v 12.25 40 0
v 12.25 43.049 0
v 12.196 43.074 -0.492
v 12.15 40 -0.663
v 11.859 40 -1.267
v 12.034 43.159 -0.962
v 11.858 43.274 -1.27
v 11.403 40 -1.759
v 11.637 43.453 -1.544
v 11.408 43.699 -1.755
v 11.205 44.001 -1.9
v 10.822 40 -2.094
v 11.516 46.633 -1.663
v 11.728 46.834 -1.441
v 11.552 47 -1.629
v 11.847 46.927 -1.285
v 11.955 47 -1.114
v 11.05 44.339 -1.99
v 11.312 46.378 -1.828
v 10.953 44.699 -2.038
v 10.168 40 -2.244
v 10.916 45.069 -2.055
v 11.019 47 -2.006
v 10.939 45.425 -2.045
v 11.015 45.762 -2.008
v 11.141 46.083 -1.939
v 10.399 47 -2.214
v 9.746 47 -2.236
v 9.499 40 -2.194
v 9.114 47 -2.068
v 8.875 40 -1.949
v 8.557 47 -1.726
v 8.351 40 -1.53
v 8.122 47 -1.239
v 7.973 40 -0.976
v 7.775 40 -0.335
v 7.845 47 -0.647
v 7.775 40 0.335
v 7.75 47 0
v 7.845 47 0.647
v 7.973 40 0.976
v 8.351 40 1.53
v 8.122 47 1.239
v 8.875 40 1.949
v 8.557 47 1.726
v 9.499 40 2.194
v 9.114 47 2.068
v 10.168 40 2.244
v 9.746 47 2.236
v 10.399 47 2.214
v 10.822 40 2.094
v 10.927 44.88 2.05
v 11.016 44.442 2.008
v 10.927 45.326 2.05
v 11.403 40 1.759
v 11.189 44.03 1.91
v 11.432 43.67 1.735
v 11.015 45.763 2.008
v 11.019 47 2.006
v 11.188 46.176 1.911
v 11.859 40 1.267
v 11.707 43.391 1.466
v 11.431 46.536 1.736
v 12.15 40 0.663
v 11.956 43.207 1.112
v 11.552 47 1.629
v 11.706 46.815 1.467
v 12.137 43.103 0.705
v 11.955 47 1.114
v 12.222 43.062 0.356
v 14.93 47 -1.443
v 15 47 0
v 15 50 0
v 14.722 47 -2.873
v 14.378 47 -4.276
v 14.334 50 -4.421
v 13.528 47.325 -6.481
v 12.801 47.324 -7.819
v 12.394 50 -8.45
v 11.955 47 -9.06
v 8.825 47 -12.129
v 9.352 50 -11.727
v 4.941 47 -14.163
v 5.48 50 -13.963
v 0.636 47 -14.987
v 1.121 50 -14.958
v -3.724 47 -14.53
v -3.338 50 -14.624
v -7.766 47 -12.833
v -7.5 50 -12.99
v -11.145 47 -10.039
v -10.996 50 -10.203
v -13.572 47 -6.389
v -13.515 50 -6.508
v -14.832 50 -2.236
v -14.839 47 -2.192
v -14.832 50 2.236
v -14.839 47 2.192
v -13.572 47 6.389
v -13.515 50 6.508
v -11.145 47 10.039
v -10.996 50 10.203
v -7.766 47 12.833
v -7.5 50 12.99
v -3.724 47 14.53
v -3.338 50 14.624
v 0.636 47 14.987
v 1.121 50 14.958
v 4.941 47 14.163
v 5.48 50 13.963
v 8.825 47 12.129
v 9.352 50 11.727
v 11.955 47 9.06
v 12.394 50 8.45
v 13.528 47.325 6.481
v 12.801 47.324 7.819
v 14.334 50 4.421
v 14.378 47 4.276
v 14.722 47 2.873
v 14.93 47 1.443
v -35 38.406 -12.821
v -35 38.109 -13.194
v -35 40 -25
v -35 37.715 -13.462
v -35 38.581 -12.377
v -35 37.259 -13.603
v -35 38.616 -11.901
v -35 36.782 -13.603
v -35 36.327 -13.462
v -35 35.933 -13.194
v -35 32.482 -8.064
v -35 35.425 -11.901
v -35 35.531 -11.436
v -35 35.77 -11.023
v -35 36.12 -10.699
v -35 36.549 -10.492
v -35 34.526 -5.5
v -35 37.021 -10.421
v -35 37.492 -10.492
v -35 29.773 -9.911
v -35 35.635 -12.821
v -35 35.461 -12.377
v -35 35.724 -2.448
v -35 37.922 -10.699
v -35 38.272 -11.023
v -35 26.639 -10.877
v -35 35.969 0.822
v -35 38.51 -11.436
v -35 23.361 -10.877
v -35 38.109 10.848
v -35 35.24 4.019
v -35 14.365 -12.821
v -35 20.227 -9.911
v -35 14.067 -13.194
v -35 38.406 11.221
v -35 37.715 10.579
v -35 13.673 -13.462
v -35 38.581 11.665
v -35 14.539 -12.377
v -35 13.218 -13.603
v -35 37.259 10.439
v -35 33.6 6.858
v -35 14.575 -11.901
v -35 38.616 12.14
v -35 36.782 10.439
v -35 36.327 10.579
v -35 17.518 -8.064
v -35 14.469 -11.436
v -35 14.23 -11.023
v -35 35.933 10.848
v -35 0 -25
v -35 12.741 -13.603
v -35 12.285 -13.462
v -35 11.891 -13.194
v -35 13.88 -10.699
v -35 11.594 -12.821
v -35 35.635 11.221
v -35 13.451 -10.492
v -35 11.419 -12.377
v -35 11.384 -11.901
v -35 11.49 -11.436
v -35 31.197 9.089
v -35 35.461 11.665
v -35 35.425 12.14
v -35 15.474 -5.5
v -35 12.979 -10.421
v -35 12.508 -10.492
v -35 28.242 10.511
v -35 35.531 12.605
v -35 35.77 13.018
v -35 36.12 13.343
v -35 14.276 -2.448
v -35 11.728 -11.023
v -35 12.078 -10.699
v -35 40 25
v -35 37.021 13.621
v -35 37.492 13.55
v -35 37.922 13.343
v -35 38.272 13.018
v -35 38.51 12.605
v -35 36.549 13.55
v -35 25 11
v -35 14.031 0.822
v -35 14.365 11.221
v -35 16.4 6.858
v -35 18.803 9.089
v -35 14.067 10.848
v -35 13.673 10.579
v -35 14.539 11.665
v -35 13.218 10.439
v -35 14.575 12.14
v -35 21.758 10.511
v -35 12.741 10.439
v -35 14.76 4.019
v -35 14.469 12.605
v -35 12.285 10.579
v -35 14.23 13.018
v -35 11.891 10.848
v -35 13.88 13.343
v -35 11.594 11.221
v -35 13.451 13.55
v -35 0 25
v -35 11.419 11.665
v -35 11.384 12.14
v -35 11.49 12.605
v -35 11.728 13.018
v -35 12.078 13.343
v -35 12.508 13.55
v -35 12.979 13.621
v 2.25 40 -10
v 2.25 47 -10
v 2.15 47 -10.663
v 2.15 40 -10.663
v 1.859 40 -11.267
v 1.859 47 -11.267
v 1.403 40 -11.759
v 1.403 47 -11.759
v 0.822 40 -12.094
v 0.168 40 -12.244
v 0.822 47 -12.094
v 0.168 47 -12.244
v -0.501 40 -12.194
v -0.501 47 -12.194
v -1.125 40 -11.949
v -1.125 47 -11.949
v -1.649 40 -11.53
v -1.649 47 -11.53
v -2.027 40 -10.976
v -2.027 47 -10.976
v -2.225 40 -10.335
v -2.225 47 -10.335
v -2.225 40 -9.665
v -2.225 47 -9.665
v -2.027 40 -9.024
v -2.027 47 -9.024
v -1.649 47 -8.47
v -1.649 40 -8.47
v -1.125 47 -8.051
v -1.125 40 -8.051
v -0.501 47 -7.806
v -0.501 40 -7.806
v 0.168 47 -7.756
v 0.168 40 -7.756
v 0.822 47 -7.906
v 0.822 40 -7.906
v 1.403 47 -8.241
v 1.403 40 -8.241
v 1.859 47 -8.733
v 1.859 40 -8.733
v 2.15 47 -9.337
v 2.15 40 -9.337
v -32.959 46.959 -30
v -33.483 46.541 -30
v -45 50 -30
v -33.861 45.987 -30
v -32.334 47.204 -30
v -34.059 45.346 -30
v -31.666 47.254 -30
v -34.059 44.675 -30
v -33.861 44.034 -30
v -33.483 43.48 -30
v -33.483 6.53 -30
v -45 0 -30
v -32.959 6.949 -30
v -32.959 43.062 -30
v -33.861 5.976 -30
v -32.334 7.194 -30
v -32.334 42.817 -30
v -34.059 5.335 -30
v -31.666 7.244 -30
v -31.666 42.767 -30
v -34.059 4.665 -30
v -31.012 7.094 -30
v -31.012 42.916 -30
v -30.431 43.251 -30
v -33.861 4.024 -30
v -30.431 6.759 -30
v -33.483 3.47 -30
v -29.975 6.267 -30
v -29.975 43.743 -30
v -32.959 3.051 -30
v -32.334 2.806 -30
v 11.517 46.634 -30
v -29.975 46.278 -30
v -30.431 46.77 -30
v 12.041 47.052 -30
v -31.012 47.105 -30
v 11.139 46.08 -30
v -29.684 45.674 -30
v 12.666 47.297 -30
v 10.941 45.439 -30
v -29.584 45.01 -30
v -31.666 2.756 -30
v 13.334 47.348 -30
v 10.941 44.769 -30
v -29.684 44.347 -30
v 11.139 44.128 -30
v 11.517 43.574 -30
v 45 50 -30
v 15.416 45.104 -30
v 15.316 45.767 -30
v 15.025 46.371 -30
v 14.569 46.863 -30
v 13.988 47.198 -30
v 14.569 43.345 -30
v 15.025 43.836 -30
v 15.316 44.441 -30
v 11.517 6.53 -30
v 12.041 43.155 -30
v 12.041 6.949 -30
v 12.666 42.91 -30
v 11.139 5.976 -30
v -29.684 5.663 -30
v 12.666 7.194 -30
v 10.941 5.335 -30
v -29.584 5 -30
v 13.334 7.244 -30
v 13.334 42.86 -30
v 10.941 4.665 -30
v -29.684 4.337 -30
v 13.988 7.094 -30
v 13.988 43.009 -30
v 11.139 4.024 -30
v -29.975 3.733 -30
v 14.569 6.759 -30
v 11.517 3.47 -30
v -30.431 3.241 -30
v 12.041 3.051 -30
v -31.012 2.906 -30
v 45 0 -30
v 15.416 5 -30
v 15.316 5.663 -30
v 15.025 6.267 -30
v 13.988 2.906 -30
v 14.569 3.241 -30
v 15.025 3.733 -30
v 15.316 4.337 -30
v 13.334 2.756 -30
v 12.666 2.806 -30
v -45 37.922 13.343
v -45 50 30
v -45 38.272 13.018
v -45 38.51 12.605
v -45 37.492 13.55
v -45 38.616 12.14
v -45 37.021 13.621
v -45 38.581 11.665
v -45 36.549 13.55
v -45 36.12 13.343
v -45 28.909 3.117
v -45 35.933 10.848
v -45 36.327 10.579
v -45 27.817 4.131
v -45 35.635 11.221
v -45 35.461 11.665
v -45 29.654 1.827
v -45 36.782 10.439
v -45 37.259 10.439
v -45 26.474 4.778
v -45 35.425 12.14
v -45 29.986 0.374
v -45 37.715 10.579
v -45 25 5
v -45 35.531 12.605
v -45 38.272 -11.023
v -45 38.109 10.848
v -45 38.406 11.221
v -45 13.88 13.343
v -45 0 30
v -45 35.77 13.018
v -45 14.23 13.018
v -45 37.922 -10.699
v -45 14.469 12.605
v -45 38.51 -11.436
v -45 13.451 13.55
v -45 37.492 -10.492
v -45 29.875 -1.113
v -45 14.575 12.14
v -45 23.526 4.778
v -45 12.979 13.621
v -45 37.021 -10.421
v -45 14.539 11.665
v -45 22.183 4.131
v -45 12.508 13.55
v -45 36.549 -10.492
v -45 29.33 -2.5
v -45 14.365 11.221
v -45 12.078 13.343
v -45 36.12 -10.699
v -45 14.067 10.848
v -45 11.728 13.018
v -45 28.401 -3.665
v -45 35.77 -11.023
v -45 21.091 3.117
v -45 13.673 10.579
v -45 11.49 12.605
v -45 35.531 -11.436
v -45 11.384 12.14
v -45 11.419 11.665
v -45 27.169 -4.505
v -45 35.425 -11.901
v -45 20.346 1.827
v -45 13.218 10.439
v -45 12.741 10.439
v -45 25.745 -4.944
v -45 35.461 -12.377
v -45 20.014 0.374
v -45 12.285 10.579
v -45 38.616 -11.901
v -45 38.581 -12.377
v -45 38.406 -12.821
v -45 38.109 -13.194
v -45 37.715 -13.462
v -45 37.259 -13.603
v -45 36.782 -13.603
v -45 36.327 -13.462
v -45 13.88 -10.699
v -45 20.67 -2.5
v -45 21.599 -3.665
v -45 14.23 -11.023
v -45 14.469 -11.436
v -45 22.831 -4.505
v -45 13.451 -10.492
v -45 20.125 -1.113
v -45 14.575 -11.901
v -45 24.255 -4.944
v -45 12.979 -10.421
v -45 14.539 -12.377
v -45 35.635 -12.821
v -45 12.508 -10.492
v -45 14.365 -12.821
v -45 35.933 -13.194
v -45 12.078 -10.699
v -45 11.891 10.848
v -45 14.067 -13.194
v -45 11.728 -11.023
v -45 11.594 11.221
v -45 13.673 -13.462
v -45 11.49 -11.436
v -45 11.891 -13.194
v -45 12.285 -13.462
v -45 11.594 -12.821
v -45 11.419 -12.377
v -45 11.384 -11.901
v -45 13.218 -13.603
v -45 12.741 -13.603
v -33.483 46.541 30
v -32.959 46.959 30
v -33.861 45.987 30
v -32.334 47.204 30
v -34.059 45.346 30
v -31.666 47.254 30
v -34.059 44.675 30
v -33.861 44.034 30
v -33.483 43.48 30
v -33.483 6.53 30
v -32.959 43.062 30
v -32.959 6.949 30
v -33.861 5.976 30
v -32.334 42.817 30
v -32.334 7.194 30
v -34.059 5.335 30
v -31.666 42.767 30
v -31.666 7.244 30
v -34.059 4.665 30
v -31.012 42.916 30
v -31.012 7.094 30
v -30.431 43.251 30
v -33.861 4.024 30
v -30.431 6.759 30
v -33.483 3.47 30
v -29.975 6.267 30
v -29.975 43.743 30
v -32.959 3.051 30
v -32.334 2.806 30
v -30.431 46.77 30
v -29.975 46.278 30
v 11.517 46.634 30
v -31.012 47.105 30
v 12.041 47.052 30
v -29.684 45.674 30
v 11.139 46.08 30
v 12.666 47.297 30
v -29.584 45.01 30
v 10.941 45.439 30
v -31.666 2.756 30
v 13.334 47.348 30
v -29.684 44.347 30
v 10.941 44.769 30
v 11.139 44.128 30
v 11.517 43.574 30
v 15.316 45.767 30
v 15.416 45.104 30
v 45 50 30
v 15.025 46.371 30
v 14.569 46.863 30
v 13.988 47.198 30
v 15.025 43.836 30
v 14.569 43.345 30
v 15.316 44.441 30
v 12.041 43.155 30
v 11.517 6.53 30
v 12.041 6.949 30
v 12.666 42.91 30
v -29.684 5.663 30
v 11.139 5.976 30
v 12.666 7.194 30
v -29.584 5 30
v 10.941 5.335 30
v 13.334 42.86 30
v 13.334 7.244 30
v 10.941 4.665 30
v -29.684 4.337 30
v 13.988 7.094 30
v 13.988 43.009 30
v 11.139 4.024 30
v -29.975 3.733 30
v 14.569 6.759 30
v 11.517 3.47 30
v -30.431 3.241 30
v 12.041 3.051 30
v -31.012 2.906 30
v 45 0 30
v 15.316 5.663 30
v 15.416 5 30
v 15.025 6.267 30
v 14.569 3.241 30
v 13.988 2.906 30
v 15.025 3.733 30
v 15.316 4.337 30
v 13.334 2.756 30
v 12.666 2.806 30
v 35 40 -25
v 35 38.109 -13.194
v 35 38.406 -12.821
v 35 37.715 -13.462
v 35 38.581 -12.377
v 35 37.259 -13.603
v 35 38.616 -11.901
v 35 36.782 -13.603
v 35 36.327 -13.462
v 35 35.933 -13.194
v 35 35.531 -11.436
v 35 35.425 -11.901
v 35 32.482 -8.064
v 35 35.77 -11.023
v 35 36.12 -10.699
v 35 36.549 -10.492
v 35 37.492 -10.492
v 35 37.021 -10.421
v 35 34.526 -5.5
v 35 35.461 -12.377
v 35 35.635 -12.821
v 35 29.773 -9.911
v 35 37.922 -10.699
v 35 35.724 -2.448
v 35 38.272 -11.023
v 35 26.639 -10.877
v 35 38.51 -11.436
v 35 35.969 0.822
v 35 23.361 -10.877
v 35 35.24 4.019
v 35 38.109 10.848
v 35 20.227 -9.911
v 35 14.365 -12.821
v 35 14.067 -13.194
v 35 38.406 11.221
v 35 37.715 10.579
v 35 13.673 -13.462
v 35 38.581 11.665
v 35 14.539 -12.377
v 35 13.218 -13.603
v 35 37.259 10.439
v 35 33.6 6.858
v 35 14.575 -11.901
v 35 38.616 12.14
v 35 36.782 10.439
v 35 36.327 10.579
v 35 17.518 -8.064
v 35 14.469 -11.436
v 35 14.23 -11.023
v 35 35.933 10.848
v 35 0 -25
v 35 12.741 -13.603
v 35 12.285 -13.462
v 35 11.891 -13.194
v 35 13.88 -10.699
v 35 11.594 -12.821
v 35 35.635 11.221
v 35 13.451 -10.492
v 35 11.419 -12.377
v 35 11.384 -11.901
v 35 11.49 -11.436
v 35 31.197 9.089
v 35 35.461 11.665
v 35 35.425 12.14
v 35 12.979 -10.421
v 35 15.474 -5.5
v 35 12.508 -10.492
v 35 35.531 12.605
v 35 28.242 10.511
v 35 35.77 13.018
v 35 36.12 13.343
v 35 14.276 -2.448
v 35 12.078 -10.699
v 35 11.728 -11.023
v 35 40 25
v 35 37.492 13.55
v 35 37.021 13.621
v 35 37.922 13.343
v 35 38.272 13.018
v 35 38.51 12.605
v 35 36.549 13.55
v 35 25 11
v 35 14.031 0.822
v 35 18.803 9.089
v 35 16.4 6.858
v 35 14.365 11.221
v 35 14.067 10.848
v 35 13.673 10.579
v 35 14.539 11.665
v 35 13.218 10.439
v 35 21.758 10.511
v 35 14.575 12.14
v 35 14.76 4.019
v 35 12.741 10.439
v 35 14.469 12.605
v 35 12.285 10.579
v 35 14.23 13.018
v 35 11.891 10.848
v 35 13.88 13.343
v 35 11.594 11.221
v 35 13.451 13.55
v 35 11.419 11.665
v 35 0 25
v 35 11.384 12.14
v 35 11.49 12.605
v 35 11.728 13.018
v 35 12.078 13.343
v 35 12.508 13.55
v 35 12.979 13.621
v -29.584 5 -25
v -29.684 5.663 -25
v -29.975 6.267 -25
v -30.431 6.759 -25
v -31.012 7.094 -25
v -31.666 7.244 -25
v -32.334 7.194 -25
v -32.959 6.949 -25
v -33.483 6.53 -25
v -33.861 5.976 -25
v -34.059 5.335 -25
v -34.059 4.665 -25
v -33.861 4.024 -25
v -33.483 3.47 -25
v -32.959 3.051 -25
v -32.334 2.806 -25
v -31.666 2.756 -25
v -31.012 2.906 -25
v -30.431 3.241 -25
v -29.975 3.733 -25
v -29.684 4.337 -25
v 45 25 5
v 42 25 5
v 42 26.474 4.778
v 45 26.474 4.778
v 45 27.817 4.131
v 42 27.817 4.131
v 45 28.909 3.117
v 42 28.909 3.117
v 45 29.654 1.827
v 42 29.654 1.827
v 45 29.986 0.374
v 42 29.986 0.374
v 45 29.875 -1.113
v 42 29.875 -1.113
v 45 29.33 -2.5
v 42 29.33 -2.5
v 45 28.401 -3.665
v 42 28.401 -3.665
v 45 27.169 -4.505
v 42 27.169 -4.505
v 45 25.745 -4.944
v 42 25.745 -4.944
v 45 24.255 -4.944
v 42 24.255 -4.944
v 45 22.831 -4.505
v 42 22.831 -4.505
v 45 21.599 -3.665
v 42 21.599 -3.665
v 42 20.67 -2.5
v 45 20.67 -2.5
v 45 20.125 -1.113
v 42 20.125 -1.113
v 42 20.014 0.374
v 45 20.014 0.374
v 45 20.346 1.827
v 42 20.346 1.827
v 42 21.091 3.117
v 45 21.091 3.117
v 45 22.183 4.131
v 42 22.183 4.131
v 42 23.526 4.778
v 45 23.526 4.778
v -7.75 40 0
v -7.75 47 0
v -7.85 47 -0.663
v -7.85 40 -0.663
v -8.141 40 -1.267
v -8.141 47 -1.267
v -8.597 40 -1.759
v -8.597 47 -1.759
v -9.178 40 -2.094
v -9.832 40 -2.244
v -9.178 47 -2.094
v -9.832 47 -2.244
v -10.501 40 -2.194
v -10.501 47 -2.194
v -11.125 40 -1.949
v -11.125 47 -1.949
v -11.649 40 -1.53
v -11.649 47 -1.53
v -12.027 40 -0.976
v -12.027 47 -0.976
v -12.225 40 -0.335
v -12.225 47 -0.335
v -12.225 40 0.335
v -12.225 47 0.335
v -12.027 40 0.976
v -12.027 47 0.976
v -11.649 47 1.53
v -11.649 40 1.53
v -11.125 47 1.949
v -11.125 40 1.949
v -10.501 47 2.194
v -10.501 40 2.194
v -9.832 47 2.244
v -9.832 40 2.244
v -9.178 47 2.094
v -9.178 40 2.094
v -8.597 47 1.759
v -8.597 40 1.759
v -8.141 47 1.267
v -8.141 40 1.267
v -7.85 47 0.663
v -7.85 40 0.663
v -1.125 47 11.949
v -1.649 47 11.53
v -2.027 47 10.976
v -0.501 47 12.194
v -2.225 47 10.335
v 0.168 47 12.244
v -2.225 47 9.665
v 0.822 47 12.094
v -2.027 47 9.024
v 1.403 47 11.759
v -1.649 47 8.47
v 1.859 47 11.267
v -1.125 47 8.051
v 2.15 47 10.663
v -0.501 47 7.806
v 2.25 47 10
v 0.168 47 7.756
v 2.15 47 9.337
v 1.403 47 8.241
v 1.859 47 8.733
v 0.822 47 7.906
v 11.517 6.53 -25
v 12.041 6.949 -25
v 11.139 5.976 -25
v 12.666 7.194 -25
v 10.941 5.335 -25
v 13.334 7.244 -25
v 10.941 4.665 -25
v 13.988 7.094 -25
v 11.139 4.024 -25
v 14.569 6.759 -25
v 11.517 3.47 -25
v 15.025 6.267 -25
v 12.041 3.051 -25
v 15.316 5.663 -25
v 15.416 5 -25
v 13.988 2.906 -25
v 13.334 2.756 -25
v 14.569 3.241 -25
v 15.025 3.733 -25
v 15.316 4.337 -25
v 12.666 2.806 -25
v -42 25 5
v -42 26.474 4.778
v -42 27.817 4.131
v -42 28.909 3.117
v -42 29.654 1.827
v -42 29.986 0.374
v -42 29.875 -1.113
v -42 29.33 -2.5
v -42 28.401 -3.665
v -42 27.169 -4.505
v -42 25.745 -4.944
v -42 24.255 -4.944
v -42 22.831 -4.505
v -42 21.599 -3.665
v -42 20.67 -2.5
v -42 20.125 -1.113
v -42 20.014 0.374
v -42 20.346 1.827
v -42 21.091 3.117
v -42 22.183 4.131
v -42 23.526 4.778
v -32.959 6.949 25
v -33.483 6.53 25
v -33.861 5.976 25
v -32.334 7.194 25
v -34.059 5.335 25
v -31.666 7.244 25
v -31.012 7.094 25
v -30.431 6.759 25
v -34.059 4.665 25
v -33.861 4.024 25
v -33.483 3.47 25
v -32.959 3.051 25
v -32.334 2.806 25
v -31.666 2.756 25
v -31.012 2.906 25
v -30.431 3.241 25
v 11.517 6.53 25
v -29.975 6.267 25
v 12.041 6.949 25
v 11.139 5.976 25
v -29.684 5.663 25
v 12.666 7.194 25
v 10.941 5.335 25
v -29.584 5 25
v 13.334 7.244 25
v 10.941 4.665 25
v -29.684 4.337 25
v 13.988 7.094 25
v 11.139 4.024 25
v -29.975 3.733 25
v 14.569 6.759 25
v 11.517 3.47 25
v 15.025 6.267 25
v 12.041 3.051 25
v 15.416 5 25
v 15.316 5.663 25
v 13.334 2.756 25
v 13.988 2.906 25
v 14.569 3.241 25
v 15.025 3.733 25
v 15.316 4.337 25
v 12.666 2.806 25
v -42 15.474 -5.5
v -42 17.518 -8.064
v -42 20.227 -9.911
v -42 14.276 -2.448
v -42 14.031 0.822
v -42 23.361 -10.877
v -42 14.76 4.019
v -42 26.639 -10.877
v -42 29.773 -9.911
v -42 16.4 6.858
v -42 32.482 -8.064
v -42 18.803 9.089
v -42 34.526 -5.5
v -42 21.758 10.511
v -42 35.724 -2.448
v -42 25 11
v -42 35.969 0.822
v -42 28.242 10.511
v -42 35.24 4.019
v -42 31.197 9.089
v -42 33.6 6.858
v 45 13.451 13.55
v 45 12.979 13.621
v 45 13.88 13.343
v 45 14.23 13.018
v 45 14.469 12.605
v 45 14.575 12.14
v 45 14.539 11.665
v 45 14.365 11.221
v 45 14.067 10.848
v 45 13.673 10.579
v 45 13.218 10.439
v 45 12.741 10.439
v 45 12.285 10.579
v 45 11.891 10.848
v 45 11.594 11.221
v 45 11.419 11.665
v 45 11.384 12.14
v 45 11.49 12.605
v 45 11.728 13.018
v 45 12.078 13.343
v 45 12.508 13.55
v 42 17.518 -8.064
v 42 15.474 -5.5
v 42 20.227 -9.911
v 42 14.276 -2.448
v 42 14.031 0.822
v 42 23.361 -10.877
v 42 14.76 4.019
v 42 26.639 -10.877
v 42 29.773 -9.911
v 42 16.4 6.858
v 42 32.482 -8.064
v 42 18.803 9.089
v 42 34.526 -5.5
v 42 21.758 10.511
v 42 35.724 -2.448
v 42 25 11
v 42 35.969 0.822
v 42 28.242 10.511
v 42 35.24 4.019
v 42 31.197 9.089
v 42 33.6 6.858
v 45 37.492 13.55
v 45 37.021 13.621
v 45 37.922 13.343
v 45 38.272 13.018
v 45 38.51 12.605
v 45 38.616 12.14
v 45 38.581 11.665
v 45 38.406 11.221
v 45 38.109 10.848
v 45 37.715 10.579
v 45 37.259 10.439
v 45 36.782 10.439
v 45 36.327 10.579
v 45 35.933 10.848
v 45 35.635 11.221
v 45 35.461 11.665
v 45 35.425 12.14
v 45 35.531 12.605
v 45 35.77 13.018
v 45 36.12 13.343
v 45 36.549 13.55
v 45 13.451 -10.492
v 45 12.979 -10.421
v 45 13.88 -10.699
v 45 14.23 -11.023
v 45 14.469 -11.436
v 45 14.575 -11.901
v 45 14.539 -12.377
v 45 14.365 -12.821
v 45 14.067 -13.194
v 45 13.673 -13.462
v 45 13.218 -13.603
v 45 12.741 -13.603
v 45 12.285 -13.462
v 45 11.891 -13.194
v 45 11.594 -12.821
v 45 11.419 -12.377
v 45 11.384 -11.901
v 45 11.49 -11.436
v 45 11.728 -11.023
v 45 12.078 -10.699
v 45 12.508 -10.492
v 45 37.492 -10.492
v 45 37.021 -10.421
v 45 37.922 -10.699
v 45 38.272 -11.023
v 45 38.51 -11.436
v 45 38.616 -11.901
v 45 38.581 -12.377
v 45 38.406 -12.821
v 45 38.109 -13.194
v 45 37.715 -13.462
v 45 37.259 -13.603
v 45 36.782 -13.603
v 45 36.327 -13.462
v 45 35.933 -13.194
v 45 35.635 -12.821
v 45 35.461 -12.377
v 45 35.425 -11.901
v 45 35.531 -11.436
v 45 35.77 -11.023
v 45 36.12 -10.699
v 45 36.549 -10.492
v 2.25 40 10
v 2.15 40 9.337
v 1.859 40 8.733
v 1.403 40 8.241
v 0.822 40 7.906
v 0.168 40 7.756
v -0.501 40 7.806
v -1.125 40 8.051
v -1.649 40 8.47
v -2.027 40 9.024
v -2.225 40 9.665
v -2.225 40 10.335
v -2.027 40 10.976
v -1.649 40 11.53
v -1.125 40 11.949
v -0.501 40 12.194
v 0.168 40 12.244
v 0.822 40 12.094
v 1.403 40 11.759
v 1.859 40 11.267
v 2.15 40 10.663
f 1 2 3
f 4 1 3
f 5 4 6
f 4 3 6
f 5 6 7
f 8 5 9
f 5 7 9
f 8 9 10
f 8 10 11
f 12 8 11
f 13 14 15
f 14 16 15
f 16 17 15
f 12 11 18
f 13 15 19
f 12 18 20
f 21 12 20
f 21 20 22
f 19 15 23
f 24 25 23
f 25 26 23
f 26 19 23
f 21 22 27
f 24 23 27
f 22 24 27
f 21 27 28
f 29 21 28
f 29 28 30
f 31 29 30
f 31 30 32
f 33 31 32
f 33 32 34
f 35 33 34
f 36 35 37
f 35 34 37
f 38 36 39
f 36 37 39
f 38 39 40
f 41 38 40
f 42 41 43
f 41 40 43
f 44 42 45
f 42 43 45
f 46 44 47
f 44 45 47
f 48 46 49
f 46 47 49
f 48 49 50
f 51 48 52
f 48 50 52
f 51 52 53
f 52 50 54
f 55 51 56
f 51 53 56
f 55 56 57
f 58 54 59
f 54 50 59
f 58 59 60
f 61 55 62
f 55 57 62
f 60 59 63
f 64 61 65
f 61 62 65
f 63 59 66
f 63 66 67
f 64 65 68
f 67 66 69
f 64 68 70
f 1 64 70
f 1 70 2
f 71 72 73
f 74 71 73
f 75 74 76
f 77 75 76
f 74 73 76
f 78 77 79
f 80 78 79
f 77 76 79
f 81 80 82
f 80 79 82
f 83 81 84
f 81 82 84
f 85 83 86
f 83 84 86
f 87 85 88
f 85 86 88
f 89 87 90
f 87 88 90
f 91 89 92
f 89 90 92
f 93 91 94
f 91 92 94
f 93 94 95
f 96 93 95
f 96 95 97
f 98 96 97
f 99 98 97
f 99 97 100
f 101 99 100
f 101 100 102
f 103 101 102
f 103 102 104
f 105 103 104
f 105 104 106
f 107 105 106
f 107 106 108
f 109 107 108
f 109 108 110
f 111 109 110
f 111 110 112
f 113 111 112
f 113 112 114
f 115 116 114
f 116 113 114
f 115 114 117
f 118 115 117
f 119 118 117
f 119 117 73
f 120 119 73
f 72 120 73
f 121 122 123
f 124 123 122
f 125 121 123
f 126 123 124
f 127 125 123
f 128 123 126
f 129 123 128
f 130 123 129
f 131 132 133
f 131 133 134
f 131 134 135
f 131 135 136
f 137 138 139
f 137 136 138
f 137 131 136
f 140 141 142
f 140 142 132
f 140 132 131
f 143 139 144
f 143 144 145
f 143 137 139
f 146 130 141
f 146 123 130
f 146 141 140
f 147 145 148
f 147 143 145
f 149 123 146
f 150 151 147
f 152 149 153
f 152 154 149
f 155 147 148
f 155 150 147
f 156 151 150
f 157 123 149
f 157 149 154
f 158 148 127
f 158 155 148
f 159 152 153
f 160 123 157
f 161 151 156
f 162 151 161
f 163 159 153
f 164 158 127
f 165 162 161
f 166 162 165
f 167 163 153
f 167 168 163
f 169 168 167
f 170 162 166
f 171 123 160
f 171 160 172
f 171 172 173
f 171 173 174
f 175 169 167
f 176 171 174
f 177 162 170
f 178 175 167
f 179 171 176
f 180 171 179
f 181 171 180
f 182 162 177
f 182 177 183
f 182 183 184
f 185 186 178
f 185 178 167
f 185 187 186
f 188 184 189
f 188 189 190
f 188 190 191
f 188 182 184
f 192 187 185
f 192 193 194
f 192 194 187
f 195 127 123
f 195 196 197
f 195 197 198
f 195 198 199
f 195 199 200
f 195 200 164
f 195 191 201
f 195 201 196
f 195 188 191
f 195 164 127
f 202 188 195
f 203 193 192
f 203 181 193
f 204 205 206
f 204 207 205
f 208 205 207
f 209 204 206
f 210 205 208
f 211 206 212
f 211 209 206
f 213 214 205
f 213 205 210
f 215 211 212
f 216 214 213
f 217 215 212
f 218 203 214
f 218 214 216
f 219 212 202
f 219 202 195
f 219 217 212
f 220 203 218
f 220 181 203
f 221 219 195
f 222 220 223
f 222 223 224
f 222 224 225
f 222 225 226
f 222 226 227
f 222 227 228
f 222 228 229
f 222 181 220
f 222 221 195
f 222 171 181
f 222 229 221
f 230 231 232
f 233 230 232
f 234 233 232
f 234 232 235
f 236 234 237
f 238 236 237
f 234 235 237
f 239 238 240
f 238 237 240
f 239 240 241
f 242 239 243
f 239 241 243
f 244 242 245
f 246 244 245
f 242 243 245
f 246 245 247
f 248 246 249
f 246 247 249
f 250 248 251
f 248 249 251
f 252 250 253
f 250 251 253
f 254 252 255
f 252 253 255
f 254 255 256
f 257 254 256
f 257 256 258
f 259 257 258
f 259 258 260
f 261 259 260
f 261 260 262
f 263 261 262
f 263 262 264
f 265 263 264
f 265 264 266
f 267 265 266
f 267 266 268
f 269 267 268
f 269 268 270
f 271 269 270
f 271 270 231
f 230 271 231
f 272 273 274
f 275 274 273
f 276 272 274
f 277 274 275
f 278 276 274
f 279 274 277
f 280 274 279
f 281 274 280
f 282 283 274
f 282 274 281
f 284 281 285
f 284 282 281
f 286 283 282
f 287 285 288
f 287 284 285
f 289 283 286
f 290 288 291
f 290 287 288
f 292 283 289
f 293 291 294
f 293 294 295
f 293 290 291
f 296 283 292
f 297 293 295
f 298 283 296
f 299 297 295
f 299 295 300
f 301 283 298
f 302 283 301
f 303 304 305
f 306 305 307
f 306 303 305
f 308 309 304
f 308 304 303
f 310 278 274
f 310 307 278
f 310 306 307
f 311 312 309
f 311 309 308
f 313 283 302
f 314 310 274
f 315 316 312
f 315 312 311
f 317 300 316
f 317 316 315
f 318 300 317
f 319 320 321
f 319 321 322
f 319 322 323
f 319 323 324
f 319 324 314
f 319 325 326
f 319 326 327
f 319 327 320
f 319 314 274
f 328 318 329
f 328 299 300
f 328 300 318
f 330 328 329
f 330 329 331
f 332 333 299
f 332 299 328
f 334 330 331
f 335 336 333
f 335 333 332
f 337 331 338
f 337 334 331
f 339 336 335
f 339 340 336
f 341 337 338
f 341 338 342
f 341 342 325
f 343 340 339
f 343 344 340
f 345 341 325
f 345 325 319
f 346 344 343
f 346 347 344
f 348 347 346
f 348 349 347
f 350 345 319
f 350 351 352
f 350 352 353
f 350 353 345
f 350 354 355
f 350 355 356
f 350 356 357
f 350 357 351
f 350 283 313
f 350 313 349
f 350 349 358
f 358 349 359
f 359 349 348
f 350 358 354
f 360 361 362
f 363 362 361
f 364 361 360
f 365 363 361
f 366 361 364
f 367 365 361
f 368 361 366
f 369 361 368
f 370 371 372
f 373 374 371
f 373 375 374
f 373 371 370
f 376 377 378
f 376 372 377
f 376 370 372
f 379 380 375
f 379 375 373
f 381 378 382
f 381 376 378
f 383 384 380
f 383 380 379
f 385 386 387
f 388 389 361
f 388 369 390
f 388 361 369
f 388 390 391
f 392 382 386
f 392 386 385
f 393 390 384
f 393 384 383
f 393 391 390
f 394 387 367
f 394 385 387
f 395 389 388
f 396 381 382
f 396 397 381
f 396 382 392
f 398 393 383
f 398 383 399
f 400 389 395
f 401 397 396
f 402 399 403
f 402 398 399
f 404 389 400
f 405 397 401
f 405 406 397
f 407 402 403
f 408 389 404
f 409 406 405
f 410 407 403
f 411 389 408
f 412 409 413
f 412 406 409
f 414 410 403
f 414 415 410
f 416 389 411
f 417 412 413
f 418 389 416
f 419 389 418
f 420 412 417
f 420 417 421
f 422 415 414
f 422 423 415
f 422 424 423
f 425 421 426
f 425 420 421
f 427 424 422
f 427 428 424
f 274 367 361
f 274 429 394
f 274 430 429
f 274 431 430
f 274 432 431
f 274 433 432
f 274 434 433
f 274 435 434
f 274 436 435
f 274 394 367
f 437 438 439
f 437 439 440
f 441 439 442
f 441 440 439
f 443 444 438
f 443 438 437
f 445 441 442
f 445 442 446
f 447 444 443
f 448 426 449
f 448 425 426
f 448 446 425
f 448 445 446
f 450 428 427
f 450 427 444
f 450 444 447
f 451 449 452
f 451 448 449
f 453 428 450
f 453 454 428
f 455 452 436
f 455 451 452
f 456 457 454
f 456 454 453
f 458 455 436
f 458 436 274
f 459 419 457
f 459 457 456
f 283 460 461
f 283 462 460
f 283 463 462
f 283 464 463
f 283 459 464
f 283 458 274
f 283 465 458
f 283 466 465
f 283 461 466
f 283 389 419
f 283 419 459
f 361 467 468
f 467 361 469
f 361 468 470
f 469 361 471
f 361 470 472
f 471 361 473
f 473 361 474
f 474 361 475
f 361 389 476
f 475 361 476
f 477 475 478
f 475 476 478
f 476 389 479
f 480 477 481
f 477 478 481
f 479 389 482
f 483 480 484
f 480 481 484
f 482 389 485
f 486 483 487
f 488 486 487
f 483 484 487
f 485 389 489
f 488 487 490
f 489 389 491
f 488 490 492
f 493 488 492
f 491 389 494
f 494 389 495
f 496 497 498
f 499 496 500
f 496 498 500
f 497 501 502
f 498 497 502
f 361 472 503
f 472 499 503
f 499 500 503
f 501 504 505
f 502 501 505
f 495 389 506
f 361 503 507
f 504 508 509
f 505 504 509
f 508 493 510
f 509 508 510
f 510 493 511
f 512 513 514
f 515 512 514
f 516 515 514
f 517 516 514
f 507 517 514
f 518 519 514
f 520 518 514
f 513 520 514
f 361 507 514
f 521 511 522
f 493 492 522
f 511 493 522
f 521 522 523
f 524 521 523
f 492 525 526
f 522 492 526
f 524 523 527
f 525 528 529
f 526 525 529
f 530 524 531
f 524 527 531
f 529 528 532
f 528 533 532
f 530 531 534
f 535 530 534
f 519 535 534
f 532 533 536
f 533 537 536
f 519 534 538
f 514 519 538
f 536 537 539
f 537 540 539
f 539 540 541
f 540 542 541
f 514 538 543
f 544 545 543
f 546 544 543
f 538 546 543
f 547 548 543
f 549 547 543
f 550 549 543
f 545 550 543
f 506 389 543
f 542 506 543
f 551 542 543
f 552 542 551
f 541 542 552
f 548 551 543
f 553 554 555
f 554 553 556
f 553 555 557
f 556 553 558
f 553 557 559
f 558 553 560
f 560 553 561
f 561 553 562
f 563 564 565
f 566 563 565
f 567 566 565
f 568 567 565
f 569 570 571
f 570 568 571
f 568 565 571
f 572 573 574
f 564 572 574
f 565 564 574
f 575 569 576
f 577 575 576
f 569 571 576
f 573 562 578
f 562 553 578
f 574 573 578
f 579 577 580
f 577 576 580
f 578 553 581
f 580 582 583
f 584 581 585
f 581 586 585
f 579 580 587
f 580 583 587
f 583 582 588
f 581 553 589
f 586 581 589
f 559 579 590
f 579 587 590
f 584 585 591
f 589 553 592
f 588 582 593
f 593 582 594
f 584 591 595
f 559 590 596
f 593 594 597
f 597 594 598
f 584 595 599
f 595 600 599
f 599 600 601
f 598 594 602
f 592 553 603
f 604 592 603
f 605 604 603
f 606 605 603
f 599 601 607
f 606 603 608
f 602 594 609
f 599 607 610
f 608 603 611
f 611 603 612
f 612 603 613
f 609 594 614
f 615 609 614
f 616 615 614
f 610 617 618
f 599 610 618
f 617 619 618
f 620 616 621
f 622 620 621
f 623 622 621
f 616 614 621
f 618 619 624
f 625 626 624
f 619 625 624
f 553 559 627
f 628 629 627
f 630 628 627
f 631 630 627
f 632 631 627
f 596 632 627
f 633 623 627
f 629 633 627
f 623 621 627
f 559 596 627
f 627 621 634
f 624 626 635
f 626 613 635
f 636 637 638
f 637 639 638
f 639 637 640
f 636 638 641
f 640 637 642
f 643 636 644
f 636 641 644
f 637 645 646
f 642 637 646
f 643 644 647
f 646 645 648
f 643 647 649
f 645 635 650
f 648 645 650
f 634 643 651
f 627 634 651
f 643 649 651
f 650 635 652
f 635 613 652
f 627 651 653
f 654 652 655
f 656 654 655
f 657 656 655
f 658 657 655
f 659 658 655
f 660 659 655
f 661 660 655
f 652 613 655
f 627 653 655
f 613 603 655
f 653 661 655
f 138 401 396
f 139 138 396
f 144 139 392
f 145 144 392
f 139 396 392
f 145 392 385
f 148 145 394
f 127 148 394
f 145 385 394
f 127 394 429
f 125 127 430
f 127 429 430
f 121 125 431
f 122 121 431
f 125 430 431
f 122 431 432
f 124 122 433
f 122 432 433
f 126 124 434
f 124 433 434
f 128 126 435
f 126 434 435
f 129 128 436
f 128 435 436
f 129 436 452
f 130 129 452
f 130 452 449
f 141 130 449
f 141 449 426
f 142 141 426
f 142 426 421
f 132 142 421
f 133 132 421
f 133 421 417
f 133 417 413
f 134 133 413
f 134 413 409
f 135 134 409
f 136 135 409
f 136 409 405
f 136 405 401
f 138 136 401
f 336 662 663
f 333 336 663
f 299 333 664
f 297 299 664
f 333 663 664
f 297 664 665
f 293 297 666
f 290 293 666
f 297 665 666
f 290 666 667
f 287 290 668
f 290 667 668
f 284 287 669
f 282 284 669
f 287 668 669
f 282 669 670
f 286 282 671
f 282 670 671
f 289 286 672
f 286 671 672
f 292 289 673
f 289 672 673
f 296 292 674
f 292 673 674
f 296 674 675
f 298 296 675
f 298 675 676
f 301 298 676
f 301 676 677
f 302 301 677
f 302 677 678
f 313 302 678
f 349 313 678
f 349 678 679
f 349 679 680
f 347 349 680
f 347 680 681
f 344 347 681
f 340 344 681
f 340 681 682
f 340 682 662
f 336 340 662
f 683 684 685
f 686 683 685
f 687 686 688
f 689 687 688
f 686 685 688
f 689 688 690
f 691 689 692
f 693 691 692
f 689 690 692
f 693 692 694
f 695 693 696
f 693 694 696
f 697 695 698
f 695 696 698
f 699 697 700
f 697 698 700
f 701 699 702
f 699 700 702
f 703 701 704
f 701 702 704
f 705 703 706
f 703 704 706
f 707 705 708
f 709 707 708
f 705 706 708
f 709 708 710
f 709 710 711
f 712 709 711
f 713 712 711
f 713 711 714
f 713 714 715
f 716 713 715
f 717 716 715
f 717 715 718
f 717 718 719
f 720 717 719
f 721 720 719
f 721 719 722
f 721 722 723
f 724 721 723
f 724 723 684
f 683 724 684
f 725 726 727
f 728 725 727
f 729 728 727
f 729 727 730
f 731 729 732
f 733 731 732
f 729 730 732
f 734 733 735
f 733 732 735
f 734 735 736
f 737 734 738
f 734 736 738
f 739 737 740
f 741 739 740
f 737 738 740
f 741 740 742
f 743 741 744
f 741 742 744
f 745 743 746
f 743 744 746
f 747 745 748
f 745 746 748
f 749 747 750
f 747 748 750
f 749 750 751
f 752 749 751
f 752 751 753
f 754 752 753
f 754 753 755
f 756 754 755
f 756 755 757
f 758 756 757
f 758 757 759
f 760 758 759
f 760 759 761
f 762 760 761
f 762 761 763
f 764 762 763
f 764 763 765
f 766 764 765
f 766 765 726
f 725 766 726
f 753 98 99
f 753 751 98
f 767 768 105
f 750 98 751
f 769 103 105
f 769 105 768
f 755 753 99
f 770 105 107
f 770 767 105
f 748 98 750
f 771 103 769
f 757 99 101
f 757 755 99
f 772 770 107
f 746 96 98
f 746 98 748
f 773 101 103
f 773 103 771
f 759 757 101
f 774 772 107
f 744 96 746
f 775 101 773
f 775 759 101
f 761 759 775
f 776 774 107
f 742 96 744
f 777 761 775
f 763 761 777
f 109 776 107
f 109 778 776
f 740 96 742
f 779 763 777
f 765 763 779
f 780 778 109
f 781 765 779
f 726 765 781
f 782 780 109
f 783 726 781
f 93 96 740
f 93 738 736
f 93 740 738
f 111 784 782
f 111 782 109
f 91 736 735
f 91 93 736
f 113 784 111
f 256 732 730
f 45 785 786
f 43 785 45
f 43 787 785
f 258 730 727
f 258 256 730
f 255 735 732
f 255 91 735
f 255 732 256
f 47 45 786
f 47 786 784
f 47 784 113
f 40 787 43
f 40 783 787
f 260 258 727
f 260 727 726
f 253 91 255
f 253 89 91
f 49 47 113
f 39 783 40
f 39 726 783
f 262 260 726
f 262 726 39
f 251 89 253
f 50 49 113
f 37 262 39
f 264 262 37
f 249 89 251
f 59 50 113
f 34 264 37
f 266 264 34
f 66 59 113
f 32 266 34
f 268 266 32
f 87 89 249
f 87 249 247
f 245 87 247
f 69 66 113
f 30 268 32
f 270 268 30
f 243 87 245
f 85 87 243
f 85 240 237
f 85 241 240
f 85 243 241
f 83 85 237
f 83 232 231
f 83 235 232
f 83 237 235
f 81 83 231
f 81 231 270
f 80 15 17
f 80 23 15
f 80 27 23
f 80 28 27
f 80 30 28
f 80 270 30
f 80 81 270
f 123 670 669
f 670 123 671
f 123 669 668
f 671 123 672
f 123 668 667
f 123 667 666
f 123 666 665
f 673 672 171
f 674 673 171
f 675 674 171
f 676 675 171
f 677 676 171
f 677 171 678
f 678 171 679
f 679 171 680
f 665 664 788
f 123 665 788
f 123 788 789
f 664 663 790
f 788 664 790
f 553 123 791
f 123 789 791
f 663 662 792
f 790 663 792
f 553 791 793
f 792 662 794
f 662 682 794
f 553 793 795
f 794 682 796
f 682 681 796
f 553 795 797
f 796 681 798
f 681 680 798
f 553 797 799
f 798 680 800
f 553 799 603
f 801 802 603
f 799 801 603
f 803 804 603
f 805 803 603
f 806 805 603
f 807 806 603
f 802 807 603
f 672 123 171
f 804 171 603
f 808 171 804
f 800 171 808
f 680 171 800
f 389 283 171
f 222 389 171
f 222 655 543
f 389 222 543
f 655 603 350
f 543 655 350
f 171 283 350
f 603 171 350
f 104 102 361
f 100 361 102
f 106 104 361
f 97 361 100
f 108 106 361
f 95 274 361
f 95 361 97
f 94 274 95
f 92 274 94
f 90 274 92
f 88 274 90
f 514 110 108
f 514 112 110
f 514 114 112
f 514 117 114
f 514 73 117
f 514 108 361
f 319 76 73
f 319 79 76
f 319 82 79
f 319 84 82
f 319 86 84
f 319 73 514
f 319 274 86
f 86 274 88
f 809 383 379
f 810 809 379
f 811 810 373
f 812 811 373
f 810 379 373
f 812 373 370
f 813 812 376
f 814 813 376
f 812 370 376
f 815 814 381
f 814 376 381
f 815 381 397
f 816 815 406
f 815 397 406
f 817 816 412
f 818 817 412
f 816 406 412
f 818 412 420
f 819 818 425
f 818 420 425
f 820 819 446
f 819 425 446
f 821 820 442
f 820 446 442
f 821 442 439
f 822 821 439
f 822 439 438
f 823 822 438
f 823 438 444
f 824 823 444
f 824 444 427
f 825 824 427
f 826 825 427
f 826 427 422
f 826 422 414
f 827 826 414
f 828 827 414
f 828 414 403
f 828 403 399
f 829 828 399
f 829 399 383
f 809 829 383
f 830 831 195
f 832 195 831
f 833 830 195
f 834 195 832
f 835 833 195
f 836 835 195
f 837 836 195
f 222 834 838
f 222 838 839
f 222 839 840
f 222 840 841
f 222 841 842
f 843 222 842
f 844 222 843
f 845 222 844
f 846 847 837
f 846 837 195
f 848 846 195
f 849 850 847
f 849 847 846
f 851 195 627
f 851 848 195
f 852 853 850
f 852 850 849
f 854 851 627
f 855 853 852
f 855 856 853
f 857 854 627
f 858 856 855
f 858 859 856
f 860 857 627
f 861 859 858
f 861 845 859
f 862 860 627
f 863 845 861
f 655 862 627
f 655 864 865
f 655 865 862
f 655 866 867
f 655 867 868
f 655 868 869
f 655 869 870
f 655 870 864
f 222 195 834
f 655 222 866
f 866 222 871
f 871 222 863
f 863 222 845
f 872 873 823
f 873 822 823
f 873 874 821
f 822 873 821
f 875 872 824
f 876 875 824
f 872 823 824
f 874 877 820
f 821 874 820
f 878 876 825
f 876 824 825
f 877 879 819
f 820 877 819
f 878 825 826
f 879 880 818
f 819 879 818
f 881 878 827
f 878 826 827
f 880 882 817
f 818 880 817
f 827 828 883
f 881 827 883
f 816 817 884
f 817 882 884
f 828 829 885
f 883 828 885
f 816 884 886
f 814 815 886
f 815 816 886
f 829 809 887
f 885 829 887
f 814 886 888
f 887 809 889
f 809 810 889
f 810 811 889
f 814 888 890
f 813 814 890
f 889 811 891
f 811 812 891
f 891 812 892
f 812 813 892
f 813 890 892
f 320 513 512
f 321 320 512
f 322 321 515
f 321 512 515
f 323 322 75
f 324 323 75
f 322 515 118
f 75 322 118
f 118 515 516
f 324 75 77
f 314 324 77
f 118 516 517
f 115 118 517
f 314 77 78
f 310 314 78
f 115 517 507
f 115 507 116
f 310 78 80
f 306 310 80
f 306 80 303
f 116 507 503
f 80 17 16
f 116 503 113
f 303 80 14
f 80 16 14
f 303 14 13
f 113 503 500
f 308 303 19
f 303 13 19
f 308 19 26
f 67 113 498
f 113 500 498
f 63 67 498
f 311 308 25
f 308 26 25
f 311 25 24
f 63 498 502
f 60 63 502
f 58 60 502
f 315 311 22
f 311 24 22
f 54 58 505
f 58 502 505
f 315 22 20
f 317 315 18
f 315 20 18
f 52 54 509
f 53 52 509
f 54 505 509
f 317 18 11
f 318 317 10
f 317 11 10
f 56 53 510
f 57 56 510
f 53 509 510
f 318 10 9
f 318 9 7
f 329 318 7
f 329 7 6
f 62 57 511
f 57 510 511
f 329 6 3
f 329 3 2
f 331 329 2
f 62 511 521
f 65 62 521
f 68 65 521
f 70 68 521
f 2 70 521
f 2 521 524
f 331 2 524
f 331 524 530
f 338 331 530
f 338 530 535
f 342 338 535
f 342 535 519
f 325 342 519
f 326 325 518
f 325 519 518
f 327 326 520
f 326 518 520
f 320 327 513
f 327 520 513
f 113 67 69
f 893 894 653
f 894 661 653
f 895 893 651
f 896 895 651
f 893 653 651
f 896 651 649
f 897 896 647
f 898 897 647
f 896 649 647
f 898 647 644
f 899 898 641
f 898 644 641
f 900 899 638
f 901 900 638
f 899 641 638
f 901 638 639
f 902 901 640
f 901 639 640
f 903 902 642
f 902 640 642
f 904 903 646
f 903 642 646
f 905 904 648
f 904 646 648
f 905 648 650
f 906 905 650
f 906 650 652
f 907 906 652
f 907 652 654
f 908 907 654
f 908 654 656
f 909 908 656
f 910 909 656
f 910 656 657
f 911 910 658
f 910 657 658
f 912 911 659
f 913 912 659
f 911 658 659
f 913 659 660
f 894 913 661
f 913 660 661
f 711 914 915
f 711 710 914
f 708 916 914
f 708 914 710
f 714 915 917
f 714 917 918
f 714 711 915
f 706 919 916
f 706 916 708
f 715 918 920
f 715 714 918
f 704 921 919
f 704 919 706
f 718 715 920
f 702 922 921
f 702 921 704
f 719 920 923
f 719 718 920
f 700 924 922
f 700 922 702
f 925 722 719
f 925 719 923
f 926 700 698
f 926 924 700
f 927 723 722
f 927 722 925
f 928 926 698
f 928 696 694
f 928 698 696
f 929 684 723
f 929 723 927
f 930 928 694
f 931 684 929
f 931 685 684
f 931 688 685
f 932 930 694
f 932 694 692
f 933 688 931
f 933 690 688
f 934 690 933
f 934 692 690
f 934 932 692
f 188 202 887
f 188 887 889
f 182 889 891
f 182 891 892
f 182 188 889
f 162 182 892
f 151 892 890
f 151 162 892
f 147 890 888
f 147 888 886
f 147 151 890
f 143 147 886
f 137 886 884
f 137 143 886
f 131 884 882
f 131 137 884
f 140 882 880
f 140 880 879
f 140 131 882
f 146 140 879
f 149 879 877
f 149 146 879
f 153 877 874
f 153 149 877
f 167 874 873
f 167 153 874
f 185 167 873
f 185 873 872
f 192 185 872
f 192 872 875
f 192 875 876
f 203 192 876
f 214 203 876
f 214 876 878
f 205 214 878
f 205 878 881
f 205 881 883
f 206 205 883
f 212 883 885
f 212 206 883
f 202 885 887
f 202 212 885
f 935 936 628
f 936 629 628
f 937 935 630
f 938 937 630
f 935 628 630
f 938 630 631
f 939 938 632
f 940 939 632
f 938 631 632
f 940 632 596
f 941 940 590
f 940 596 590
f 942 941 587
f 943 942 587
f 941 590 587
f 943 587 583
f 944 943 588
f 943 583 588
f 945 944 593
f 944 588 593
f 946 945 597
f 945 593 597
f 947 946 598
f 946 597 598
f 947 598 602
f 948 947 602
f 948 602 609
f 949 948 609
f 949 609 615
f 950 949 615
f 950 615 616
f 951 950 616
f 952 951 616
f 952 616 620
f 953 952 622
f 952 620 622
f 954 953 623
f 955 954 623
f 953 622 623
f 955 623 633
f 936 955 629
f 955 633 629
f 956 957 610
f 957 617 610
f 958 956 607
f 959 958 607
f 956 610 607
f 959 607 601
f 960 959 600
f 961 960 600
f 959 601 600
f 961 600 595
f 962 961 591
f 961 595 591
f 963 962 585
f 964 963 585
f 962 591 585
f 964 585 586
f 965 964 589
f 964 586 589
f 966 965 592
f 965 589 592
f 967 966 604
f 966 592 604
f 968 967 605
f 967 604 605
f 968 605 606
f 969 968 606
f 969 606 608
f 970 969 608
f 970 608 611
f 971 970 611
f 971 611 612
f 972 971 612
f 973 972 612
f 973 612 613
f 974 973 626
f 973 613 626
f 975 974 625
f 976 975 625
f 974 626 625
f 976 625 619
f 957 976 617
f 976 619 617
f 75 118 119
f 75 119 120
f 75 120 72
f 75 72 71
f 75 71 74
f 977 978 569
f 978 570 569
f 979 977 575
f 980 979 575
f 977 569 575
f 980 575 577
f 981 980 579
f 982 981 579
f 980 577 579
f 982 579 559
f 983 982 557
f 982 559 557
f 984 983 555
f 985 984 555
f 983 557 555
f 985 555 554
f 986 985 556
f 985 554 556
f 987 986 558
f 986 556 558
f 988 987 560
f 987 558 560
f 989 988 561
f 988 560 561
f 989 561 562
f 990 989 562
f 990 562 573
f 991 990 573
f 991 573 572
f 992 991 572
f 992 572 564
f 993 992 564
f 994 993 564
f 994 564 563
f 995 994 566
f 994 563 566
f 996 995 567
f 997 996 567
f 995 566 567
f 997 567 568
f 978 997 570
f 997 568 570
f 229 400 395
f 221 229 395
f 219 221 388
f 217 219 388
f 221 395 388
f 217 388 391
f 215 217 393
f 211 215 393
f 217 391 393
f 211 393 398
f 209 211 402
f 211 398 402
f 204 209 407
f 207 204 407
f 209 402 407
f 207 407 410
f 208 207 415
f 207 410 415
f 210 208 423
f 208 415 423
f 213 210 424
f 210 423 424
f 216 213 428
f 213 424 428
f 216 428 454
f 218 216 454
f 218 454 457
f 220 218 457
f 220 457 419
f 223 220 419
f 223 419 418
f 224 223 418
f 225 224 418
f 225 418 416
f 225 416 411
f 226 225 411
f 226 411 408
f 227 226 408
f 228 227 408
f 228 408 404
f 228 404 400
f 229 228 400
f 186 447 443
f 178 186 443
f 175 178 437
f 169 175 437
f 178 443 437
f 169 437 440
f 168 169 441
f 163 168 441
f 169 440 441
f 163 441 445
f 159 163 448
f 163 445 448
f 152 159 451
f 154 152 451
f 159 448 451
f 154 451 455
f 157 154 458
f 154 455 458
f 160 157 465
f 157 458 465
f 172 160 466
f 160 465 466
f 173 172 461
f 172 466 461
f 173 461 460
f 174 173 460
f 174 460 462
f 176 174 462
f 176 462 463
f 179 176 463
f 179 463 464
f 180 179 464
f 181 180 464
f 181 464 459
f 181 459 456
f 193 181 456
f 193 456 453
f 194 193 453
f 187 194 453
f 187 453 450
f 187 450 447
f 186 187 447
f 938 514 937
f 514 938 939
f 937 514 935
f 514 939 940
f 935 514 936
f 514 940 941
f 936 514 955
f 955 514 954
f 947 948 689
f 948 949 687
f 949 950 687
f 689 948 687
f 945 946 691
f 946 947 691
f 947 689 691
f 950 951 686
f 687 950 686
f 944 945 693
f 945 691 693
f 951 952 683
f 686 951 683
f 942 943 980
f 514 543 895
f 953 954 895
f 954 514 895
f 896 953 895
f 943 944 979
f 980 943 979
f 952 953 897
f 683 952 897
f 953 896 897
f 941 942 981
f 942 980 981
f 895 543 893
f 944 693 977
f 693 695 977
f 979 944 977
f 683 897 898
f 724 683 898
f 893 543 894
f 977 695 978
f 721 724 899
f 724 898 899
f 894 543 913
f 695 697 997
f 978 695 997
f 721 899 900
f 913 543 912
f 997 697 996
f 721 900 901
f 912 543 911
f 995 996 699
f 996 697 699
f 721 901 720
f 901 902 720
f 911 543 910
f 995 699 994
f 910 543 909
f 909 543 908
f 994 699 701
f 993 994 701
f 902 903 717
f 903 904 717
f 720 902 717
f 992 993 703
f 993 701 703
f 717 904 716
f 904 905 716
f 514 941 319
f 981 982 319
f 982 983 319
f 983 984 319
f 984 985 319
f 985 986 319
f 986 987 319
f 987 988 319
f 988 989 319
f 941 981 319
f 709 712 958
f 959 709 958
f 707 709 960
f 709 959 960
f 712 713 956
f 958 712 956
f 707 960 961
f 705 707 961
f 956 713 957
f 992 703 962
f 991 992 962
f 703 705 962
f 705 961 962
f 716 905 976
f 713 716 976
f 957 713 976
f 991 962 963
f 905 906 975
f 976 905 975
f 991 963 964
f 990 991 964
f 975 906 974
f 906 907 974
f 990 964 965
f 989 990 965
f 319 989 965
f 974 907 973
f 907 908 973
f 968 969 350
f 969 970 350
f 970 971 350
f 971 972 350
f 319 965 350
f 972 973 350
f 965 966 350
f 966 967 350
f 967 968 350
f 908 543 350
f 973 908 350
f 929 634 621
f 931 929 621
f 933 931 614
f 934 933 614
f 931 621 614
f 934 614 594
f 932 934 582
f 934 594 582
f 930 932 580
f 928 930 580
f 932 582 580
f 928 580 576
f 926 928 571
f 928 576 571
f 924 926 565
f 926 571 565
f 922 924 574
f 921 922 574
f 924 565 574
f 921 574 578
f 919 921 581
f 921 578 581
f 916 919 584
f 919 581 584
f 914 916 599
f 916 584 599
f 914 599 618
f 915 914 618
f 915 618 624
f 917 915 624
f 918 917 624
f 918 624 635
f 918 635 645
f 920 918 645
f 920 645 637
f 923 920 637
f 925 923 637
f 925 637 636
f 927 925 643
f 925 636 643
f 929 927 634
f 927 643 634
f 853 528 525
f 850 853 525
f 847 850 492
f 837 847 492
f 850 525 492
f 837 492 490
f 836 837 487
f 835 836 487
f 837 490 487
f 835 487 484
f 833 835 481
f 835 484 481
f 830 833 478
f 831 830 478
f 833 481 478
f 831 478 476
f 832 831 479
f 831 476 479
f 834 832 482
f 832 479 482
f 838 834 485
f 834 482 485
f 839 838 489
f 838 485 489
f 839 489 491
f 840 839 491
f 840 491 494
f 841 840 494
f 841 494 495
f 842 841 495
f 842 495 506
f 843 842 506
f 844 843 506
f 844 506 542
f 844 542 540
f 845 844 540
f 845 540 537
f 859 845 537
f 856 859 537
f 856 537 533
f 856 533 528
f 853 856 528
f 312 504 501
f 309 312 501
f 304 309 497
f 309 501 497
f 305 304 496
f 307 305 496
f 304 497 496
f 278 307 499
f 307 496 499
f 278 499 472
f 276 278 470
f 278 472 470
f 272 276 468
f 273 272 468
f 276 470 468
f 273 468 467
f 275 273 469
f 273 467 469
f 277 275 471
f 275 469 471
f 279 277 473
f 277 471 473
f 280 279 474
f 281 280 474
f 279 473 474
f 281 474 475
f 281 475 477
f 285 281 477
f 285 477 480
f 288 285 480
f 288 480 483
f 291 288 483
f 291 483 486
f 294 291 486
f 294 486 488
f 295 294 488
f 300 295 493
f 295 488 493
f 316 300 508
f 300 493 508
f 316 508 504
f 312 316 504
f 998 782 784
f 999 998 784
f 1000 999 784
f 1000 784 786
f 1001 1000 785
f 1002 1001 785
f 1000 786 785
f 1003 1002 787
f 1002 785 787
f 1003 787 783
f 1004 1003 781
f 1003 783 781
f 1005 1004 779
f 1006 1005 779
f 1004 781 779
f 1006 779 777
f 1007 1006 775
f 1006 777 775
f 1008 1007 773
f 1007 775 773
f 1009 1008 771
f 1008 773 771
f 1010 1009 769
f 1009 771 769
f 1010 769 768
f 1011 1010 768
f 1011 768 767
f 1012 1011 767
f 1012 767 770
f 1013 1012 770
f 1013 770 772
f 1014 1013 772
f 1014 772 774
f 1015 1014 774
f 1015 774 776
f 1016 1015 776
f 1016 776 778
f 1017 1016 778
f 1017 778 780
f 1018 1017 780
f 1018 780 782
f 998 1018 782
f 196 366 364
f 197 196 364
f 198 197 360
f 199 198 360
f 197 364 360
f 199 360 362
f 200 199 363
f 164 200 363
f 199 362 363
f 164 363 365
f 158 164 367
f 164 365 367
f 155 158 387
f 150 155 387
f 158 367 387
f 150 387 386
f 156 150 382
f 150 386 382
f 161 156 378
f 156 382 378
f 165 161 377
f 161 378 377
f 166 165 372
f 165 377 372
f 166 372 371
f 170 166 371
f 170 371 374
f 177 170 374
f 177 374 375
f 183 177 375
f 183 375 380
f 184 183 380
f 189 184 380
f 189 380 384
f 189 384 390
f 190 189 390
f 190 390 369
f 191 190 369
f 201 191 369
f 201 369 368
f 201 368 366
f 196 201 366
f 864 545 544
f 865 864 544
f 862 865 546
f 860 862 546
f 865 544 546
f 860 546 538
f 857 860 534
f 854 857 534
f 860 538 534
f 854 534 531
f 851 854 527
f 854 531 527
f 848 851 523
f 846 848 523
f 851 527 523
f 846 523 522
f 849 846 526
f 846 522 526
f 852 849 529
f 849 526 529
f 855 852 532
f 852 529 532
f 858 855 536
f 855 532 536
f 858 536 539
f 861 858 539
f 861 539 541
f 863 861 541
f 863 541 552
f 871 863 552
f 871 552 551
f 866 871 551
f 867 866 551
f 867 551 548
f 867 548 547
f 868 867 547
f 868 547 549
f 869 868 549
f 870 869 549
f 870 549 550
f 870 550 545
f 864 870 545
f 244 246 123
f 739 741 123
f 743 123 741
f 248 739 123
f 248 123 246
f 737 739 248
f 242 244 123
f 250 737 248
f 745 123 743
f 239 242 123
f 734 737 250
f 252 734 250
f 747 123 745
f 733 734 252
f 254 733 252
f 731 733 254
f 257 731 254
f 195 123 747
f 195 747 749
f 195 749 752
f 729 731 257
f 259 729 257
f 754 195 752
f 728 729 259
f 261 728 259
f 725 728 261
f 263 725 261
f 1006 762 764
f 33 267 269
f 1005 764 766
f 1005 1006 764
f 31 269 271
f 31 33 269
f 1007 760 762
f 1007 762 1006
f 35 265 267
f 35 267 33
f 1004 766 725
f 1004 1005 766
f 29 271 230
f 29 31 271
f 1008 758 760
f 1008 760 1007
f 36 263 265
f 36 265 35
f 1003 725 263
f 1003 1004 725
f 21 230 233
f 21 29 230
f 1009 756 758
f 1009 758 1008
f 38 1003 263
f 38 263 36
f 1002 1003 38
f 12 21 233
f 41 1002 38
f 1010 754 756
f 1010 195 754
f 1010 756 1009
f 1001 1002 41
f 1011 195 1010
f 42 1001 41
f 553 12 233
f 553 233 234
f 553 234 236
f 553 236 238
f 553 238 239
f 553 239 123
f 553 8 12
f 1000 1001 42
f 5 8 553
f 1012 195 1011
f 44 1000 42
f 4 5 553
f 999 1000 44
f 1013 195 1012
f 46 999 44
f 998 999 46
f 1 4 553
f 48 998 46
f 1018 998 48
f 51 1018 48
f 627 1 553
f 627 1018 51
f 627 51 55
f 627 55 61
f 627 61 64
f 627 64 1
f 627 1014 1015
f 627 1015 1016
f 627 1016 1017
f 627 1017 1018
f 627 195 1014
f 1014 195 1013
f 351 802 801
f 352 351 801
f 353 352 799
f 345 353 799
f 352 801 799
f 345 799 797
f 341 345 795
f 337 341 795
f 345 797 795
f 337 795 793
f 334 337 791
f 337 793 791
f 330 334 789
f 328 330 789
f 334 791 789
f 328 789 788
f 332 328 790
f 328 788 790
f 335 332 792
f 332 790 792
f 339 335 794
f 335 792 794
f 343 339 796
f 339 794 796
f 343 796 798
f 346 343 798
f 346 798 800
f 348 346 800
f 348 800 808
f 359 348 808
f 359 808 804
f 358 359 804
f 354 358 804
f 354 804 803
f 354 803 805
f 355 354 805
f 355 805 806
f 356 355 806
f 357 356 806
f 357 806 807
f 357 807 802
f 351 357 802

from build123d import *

# Parameters (mm, degrees)
SKETCH1_W           = 90
SKETCH1_H           = 60
BOSS_EXTRUDE1_DEPTH = 50
SKETCH2_W           = 70
SKETCH2_H           = 50
CUT_EXTRUDE1_DEPTH  = 40
CUT_EXTRUDE3_START  = 50
SKETCH1_5_R         = 2.25
CUT_EXTRUDE3_DEPTH  = 40
CUT_EXTRUDE4_START  = 50
SKETCH1_6_R         = 15
SKETCH1_6_R_2       = 2.25
CUT_EXTRUDE4_DEPTH  = 3
SKETCH3_R           = 5
CUT_EXTRUDE5_DEPTH  = 91
CUT_EXTRUDE7_START  = -10
SKETCH3_3_R         = 11
SKETCH3_3_R_2       = 5
SKETCH3_3_R_3       = 1.6
CUT_EXTRUDE7_DEPTH  = 7
CUT_EXTRUDE8_START  = -80
SKETCH3_4_R         = 11
SKETCH3_4_R_2       = 5
SKETCH3_4_R_3       = 1.6
CUT_EXTRUDE8_DEPTH  = 7
SKETCH3_5_R         = 1.6
CUT_EXTRUDE9_DEPTH  = 91
SKETCH4_R           = 2.25
CUT_EXTRUDE10_DEPTH = 60


with BuildPart() as part:
    # Sketch1 → Boss-Extrude1 (new body)
    with BuildSketch(Plane(origin=(0, 0, 0), x_dir=(1, 0, 0), z_dir=(0, 1, 0))):
        Rectangle(SKETCH1_W, SKETCH1_H)
    extrude(amount=BOSS_EXTRUDE1_DEPTH)

    # Sketch2 → Cut-Extrude1 (cut)
    with BuildSketch(Plane.XZ):
        Rectangle(SKETCH2_W, SKETCH2_H)
    extrude(amount=-CUT_EXTRUDE1_DEPTH, mode=Mode.SUBTRACT)

    # Sketch1<5> → Cut-Extrude3 (cut)
    with BuildSketch(Plane(origin=(0, 0, 0), x_dir=(1, 0, 0), z_dir=(0, 1, 0)).offset(CUT_EXTRUDE3_START)):
        with Locations((0, -10)):
            Circle(SKETCH1_5_R)
        with Locations((-10, 0)):
            Circle(SKETCH1_5_R)
        with Locations((0, 10)):
            Circle(SKETCH1_5_R)
        with Locations((10, 0)):
            Circle(SKETCH1_5_R)
    extrude(amount=-CUT_EXTRUDE3_DEPTH, mode=Mode.SUBTRACT)

    # Sketch1<6> → Cut-Extrude4 (cut)
    with BuildSketch(Plane(origin=(0, 0, 0), x_dir=(1, 0, 0), z_dir=(0, 1, 0)).offset(CUT_EXTRUDE4_START)):
        Circle(SKETCH1_6_R)
        with Locations((-10, 0)):
            Circle(SKETCH1_6_R_2, mode=Mode.SUBTRACT)
        with Locations((0, -10)):
            Circle(SKETCH1_6_R_2, mode=Mode.SUBTRACT)
        with Locations((10, 0)):
            Circle(SKETCH1_6_R_2, mode=Mode.SUBTRACT)
        with Locations((0, 10)):
            Circle(SKETCH1_6_R_2, mode=Mode.SUBTRACT)
    extrude(amount=-CUT_EXTRUDE4_DEPTH, mode=Mode.SUBTRACT)

    # Sketch3 → Cut-Extrude5 (cut, through all)
    with BuildSketch(Plane.ZY.offset(45)):
        with Locations((0, 25)):
            Circle(SKETCH3_R)
    extrude(amount=-CUT_EXTRUDE5_DEPTH, mode=Mode.SUBTRACT)

    # Sketch3<3> → Cut-Extrude7 (cut)
    with BuildSketch(Plane.ZY.offset(45).offset(CUT_EXTRUDE7_START)):
        with Locations((0, 25)):
            Circle(SKETCH3_3_R)
        with Locations((0, 25)):
            Circle(SKETCH3_3_R_2, mode=Mode.SUBTRACT)
        with Locations((-12.02081528, 37.02081528)):
            Circle(SKETCH3_3_R_3)
        with Locations((12.02081528, 37.02081528)):
            Circle(SKETCH3_3_R_3)
        with Locations((12.02081528, 12.97918472)):
            Circle(SKETCH3_3_R_3)
        with Locations((-12.02081528, 12.97918472)):
            Circle(SKETCH3_3_R_3)
    extrude(amount=CUT_EXTRUDE7_DEPTH, mode=Mode.SUBTRACT)

    # Sketch3<4> → Cut-Extrude8 (cut)
    with BuildSketch(Plane.ZY.offset(45).offset(CUT_EXTRUDE8_START)):
        with Locations((0, 25)):
            Circle(SKETCH3_4_R)
        with Locations((0, 25)):
            Circle(SKETCH3_4_R_2, mode=Mode.SUBTRACT)
        with Locations((-12.02081528, 37.02081528)):
            Circle(SKETCH3_4_R_3)
        with Locations((12.02081528, 37.02081528)):
            Circle(SKETCH3_4_R_3)
        with Locations((12.02081528, 12.97918472)):
            Circle(SKETCH3_4_R_3)
        with Locations((-12.02081528, 12.97918472)):
            Circle(SKETCH3_4_R_3)
    extrude(amount=-CUT_EXTRUDE8_DEPTH, mode=Mode.SUBTRACT)

    # Sketch3<5> → Cut-Extrude9 (cut, through all)
    with BuildSketch(Plane.ZY.offset(45)):
        with Locations((-12.02081528, 37.02081528)):
            Circle(SKETCH3_5_R)
        with Locations((12.02081528, 37.02081528)):
            Circle(SKETCH3_5_R)
        with Locations((12.02081528, 12.97918472)):
            Circle(SKETCH3_5_R)
        with Locations((-12.02081528, 12.97918472)):
            Circle(SKETCH3_5_R)
    extrude(amount=-CUT_EXTRUDE9_DEPTH, mode=Mode.SUBTRACT)

    # Sketch4 → Cut-Extrude10 (cut)
    with BuildSketch(Plane.XY.offset(30)):
        with Locations((-31.833799112, 5)):
            Circle(SKETCH4_R)
        with Locations((-31.833799112, 45.010389169)):
            Circle(SKETCH4_R)
        with Locations((13.166200888, 5)):
            Circle(SKETCH4_R)
        with Locations((13.166200888, 45.10389169)):
            Circle(SKETCH4_R)
    extrude(amount=-CUT_EXTRUDE10_DEPTH, mode=Mode.SUBTRACT)


solid = part.part
